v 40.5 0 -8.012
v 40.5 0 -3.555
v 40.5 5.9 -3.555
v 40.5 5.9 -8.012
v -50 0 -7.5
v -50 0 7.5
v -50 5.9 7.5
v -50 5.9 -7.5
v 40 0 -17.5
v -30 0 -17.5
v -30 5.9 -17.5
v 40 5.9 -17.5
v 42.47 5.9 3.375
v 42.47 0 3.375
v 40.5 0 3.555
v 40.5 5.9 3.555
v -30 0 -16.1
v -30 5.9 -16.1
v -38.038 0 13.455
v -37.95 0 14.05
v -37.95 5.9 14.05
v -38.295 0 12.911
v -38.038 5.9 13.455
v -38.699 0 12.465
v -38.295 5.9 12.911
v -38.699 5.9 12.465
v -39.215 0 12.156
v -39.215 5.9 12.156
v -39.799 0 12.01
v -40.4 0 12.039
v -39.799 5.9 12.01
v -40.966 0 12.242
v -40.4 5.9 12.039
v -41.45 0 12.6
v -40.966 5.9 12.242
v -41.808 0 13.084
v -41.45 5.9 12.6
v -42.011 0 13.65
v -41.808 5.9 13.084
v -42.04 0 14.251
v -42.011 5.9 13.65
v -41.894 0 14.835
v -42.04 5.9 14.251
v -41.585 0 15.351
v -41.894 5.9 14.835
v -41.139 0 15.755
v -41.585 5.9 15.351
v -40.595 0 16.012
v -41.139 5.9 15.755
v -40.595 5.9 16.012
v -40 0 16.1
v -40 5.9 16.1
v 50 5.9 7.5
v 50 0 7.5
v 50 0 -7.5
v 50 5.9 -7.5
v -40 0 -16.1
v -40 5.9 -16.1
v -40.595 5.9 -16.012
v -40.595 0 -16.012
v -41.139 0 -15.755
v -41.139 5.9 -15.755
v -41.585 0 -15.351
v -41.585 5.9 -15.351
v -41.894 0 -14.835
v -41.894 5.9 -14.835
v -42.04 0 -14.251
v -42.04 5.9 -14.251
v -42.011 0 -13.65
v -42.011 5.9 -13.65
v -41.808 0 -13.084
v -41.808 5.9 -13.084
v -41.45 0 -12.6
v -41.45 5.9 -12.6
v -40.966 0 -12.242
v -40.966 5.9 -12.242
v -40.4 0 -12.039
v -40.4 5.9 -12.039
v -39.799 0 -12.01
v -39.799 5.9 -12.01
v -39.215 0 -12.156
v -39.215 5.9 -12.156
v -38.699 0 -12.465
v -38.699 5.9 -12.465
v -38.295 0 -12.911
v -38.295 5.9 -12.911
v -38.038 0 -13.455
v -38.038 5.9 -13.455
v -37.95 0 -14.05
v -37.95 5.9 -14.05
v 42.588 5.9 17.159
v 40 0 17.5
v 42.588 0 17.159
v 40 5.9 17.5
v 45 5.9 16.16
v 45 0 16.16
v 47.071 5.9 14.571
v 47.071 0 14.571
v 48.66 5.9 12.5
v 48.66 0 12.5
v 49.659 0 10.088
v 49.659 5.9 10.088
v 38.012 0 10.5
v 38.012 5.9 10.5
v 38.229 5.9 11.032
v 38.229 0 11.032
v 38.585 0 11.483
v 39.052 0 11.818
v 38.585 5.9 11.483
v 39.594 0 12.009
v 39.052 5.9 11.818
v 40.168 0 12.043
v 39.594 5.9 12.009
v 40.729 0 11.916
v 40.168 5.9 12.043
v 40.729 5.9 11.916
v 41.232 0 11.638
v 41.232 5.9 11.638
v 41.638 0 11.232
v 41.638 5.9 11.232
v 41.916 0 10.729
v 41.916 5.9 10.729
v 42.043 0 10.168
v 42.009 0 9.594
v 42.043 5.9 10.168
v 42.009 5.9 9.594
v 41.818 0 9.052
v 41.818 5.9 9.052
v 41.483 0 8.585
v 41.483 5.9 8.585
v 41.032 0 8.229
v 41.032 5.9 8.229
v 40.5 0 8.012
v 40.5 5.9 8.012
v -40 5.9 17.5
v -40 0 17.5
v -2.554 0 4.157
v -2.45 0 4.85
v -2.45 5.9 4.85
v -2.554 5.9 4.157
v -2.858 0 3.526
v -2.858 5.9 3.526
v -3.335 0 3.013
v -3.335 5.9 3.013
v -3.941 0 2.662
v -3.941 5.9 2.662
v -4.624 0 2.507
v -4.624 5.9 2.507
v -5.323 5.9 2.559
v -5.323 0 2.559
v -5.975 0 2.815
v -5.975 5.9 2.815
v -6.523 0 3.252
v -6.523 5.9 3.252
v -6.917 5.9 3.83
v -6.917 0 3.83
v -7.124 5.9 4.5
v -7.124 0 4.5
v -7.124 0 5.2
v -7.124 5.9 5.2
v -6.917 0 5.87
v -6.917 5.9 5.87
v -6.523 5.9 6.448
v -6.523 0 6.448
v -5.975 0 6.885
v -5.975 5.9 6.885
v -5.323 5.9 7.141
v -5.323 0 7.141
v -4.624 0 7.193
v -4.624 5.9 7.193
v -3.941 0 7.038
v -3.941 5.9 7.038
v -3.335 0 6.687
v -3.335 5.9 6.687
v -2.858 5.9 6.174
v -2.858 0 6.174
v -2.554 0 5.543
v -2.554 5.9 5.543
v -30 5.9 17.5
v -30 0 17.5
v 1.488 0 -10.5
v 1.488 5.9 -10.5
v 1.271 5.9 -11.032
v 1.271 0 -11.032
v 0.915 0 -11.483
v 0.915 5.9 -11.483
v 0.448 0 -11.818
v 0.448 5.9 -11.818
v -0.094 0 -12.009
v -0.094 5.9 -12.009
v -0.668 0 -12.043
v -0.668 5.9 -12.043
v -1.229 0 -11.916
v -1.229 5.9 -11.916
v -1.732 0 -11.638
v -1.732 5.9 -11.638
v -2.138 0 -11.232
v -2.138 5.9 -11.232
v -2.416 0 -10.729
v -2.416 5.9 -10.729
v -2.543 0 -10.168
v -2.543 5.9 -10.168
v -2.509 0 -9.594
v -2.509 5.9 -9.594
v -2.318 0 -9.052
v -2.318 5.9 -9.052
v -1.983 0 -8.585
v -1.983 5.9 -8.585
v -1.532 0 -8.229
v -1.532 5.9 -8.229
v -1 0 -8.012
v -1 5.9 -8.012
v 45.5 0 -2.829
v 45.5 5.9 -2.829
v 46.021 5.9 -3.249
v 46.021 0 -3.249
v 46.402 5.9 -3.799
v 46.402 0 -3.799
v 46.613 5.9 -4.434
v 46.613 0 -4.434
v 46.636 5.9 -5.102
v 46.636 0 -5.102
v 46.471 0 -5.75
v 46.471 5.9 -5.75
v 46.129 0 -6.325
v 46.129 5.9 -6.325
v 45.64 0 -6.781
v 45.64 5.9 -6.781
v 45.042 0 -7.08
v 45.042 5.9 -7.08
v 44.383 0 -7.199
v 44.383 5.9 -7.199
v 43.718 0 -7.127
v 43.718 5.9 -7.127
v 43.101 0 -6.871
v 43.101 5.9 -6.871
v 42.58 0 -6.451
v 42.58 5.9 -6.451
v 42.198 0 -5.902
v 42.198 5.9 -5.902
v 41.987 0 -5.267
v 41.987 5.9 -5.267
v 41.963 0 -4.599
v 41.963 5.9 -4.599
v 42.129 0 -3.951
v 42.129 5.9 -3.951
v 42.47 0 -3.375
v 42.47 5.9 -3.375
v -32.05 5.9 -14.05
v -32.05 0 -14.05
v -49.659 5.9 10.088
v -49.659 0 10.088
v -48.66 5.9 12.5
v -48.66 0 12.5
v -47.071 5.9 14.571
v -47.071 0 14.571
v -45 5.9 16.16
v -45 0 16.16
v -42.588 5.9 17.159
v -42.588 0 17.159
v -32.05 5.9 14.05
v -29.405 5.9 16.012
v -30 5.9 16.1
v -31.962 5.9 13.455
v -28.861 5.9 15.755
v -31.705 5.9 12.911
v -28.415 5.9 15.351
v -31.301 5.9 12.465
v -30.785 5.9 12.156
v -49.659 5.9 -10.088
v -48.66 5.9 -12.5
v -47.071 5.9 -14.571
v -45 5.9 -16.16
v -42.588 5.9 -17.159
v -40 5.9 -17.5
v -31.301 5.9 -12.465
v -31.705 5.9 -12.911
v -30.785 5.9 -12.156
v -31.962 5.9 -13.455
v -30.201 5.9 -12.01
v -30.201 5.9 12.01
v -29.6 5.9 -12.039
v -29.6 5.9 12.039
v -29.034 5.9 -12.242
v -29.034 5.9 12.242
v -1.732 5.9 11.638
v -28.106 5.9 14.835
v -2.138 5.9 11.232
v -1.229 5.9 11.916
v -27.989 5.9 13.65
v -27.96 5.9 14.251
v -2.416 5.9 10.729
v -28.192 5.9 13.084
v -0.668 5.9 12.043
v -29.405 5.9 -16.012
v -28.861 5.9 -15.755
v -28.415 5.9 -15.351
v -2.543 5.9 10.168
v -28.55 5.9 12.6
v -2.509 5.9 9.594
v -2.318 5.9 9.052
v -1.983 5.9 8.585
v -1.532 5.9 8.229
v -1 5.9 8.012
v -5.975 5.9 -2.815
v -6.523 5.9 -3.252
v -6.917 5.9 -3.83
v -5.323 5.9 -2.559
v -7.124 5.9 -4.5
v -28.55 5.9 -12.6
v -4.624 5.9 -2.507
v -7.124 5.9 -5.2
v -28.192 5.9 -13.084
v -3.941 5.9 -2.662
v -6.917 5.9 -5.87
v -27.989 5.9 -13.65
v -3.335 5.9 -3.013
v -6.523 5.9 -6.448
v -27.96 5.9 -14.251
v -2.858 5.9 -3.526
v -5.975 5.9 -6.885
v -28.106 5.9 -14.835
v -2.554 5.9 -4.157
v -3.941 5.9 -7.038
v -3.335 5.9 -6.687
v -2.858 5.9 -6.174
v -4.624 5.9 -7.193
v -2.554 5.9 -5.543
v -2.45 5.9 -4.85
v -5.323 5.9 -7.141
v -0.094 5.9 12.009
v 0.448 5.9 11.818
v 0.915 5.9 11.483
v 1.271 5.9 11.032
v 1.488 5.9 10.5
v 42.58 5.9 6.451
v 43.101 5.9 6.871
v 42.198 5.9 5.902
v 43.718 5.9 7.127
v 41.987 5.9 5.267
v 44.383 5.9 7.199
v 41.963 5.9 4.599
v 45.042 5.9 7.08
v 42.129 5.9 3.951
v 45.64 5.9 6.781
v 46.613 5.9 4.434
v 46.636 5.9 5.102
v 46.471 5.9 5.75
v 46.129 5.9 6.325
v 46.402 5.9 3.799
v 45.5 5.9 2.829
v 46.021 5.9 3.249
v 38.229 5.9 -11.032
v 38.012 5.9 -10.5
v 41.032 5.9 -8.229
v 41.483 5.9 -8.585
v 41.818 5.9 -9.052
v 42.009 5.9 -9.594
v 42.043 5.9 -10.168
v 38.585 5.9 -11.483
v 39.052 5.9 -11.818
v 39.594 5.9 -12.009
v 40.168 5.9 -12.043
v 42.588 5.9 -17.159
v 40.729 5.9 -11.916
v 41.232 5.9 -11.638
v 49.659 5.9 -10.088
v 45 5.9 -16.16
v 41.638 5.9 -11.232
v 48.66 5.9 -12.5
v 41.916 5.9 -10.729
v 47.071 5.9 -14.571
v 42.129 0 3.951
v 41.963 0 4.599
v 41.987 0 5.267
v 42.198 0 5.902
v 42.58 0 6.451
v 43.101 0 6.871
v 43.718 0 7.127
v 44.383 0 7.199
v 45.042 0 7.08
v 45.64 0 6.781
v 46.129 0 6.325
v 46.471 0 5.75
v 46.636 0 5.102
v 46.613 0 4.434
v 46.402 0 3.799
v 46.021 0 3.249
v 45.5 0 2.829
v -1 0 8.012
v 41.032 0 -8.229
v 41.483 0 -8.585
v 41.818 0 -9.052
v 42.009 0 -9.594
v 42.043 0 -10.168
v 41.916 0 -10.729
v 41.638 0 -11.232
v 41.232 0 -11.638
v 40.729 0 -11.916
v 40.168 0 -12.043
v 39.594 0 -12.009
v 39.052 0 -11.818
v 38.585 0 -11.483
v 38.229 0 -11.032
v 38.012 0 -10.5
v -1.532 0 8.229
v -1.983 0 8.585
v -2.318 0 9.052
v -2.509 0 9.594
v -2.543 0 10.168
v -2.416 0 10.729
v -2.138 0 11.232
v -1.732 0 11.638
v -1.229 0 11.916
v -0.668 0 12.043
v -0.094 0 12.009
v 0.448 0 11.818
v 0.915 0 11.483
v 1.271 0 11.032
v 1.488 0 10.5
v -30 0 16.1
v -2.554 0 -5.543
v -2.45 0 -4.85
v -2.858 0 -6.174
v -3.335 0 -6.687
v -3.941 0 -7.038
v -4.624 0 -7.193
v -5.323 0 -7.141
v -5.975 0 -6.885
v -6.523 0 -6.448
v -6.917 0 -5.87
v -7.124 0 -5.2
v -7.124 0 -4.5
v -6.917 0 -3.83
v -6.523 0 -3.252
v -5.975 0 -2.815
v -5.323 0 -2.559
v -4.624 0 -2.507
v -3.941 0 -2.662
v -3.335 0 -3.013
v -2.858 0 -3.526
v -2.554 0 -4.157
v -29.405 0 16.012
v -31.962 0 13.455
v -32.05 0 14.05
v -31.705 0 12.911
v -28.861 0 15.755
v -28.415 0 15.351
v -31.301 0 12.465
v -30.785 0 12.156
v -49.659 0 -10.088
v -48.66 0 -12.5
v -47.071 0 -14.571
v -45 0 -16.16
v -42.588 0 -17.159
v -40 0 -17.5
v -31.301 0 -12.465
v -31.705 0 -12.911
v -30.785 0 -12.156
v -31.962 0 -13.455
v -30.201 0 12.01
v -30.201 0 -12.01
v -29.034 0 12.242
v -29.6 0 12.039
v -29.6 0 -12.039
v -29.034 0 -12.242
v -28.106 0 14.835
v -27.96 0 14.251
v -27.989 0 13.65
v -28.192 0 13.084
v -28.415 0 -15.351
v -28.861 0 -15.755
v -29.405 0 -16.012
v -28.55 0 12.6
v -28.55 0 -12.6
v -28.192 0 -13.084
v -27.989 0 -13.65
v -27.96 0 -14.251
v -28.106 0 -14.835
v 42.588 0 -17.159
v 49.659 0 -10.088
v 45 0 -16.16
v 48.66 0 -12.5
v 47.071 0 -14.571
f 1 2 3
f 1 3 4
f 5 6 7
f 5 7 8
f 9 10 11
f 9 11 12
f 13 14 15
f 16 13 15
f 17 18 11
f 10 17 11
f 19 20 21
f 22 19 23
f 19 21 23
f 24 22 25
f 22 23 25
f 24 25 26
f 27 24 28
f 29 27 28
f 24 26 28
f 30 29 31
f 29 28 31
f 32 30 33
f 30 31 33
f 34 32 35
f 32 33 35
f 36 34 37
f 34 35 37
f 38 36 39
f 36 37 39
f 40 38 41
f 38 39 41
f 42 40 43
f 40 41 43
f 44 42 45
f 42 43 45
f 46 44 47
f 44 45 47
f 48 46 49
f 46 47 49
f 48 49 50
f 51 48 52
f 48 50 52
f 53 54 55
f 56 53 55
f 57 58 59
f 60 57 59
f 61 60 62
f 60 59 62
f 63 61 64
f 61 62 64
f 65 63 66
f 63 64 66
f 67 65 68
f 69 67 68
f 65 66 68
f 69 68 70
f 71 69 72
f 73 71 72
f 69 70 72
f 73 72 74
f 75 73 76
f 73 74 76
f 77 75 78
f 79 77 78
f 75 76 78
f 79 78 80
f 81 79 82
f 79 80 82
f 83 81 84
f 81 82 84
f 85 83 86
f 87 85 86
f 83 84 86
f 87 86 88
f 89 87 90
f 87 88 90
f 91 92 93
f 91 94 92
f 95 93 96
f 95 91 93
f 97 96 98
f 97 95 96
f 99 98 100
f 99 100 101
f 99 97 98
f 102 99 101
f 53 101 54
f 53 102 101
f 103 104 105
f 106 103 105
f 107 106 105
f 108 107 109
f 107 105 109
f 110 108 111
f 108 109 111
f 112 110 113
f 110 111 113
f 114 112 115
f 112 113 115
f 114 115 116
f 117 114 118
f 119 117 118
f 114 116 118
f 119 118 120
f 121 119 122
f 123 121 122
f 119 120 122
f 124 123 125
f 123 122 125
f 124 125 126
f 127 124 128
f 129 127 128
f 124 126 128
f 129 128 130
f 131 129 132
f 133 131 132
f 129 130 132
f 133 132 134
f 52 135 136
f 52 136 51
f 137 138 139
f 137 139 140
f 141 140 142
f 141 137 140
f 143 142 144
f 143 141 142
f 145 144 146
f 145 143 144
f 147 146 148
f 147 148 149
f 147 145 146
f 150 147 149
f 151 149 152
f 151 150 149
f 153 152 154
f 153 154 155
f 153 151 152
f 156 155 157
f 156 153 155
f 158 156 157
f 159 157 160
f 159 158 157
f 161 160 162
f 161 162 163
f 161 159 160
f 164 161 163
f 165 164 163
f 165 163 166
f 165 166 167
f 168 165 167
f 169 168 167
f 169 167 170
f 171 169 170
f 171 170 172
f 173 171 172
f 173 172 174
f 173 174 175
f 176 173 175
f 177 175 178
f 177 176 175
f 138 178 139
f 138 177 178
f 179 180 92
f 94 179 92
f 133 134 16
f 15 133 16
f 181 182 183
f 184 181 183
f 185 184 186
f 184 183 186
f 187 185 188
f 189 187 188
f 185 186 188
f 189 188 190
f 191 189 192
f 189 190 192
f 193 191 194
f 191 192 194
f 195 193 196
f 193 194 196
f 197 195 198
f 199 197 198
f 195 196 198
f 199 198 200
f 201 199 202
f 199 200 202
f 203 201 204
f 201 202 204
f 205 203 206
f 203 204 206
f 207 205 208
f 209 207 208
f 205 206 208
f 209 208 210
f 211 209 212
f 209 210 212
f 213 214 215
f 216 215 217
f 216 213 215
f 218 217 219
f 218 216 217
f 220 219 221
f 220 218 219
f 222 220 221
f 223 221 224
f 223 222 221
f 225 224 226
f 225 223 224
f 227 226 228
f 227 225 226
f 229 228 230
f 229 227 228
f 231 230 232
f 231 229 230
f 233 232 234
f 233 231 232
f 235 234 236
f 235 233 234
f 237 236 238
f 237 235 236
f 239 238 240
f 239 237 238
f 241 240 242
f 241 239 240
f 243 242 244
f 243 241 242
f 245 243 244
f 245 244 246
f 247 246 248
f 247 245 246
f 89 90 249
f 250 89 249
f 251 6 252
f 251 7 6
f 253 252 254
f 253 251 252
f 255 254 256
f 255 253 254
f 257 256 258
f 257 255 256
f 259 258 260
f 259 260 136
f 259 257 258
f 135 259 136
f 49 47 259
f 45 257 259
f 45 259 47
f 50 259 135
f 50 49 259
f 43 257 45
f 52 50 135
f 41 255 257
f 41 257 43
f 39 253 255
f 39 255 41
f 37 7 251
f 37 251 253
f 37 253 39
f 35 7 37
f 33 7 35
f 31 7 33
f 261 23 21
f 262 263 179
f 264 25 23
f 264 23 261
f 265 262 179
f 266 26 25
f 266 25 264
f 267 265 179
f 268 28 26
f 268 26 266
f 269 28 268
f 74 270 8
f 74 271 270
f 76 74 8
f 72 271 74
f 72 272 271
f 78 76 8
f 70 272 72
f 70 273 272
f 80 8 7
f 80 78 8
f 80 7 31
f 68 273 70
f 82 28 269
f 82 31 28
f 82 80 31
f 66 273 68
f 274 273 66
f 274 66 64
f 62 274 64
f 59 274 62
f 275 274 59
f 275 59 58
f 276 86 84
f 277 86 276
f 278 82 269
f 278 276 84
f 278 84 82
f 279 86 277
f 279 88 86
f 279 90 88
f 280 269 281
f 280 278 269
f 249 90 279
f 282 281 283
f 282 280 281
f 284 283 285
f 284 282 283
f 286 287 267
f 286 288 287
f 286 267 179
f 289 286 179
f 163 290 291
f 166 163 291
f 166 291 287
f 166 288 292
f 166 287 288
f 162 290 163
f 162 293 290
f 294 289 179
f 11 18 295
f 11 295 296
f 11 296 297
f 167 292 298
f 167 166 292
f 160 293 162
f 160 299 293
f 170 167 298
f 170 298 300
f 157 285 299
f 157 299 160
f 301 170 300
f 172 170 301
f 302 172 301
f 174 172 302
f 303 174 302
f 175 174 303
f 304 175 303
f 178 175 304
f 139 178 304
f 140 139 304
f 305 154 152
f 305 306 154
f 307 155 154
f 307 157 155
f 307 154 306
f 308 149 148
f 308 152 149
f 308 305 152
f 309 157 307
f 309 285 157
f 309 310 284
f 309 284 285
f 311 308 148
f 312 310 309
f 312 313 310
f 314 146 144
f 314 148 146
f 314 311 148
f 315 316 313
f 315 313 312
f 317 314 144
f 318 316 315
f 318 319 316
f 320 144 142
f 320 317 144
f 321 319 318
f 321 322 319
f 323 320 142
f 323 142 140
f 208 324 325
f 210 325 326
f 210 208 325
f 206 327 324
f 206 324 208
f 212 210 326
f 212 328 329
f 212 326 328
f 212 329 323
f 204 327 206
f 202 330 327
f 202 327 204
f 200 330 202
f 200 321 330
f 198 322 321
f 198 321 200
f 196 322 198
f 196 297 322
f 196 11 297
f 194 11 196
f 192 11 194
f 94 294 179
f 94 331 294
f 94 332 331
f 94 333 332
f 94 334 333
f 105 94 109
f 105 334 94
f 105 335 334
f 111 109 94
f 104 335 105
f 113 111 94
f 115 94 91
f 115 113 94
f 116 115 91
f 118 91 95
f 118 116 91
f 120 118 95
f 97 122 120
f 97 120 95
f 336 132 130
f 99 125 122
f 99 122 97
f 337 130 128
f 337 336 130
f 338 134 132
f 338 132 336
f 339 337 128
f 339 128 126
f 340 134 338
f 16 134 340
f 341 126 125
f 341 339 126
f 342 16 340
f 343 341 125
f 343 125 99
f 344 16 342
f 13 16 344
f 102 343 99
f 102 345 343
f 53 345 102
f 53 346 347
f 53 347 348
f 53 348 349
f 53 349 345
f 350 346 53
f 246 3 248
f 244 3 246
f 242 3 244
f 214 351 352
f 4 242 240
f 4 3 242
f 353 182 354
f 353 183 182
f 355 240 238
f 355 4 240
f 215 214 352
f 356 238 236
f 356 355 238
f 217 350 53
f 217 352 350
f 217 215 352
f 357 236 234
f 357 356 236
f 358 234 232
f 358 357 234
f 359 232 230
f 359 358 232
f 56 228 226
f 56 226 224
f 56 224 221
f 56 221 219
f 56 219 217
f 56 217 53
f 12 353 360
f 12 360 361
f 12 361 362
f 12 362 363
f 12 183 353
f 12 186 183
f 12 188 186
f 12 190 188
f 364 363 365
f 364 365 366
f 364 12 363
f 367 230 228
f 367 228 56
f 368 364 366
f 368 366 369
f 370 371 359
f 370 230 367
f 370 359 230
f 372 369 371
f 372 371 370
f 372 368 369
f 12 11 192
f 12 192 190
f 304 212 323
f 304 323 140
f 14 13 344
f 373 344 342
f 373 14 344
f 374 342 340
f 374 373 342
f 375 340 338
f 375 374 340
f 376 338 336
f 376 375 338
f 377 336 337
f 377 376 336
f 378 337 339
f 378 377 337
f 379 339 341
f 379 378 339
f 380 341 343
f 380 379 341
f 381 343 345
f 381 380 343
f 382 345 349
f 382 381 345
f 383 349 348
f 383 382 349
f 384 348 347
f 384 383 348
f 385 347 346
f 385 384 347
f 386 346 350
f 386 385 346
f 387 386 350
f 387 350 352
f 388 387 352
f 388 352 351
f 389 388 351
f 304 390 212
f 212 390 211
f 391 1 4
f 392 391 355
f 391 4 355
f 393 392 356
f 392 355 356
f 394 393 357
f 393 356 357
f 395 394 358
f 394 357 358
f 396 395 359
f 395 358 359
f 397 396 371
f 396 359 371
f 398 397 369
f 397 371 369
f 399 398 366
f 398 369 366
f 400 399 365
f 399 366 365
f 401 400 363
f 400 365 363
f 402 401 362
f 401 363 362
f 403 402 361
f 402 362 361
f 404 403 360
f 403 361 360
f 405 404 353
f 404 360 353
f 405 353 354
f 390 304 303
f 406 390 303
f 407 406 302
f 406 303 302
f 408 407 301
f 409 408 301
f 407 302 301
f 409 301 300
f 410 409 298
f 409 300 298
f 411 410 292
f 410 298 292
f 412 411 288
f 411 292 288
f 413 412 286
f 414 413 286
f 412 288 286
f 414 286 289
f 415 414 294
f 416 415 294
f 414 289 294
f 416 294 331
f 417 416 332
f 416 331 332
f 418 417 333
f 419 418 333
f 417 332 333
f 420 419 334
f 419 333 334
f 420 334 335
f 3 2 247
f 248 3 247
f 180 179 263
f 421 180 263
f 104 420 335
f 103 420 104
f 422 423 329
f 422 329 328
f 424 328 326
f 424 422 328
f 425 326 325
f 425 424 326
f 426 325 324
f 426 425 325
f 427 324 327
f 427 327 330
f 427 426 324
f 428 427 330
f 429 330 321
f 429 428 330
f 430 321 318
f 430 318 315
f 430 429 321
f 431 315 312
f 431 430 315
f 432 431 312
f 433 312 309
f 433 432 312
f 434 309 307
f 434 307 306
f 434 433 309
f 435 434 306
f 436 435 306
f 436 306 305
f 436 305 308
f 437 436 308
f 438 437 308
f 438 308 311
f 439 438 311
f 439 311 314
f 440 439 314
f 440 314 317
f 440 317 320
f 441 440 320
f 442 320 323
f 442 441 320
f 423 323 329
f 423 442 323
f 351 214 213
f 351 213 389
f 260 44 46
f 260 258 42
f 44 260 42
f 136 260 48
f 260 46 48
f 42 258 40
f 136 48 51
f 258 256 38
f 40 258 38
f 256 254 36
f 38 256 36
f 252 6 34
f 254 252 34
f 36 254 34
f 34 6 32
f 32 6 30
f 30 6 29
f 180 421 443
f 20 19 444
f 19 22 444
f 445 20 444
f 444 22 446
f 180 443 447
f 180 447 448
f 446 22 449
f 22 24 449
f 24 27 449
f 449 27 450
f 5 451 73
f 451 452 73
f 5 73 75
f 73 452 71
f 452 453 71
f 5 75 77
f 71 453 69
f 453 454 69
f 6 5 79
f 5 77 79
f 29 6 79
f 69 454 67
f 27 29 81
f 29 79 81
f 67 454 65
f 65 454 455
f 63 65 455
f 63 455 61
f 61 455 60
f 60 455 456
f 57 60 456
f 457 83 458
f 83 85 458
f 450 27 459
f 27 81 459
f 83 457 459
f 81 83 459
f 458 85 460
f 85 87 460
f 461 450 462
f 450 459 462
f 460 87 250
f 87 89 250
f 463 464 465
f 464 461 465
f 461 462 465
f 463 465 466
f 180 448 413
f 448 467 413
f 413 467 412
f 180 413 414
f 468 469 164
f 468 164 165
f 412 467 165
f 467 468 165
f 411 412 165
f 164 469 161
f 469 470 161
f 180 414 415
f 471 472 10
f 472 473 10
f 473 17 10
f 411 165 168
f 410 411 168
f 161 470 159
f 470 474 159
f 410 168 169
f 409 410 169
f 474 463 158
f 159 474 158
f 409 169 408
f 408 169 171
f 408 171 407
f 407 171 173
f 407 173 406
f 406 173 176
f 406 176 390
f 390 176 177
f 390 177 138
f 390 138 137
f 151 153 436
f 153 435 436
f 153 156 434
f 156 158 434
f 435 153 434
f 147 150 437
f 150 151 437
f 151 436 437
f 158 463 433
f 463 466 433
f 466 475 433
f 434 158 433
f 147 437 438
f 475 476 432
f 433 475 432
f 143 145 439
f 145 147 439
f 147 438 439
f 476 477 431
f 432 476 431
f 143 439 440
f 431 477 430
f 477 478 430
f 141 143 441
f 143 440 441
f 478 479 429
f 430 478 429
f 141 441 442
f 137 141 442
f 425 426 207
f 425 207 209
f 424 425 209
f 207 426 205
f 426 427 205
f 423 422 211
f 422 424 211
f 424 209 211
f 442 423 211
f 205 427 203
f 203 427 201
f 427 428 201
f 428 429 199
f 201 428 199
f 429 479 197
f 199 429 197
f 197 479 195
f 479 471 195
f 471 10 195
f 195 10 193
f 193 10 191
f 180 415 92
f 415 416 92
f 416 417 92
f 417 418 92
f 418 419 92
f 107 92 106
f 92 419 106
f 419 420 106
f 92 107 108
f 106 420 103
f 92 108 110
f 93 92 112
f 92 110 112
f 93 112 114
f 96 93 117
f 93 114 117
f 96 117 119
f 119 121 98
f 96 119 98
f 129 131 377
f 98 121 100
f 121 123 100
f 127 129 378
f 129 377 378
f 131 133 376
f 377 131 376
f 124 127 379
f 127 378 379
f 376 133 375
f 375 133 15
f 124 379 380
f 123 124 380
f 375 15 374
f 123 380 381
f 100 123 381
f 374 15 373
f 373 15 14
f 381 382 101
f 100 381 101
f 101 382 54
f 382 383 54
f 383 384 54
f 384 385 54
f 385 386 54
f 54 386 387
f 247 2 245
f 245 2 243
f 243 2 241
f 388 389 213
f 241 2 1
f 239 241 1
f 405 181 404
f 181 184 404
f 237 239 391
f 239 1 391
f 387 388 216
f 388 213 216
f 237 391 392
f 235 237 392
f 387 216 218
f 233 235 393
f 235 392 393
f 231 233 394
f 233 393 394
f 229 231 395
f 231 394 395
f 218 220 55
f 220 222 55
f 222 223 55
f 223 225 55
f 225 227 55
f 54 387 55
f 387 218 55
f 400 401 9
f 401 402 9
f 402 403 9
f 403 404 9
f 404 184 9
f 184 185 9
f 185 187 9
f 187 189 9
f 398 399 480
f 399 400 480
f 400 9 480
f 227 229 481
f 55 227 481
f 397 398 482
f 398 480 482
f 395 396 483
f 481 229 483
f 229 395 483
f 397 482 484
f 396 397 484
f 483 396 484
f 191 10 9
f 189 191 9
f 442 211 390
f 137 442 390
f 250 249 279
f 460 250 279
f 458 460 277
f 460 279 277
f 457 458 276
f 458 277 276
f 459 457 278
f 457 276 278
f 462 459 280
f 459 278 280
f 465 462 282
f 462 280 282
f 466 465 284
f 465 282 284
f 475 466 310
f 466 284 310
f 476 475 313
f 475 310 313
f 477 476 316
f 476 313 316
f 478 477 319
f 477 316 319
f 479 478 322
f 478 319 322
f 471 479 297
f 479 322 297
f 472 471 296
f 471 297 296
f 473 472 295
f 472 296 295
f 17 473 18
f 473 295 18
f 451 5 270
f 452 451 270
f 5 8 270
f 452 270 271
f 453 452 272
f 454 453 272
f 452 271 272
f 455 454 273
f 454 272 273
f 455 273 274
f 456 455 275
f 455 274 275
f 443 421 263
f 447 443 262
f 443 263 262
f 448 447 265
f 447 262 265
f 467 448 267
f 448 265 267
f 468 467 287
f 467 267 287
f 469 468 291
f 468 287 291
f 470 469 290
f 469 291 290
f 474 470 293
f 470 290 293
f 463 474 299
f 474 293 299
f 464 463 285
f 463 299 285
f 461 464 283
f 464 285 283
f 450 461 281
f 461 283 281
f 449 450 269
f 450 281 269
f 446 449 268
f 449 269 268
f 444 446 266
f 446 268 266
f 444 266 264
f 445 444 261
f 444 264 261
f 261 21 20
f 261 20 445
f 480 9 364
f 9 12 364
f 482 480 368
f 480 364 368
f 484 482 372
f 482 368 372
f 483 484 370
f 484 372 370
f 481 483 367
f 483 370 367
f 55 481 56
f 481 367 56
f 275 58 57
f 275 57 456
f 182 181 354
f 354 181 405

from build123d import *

# Parameters (mm, degrees)
SKETCH1_W           = 100
SKETCH1_H           = 35
SKETCH1_R           = 2.35
SKETCH1_W_2         = 40.5
SKETCH1_H_2         = 20
BOSS_EXTRUDE1_DEPTH = 5.9
FILLET1_R           = 10
SKETCH3_W           = 10
SKETCH3_H           = 3.45
CUT_EXTRUDE2_DEPTH  = 10
CUT_EXTRUDE3_REACH  = 7.9
SKETCH4_R           = 2.05
CUT_EXTRUDE4_REACH  = 7.9
CUT_EXTRUDE5_START  = -5.9
SKETCH7_W           = 41.5
SKETCH7_H           = 21
CUT_EXTRUDE5_DEPTH  = 5.9


with BuildPart() as part:
    # Sketch1 → Boss-Extrude1 (new body)
    with BuildSketch(Plane(origin=(0, 0, 0), x_dir=(1, 0, 0), z_dir=(0, 1, 0))):
        Rectangle(SKETCH1_W, SKETCH1_H)
        with Locations((-4.8, 4.85)):
            Circle(SKETCH1_R, mode=Mode.SUBTRACT)
        with Locations((-4.8, -4.85)):
            Circle(SKETCH1_R, mode=Mode.SUBTRACT)
        with Locations((44.3, -4.85)):
            Circle(SKETCH1_R, mode=Mode.SUBTRACT)
        with Locations((44.3, 4.85)):
            Circle(SKETCH1_R, mode=Mode.SUBTRACT)
        with Locations((19.75, 0)):
            Rectangle(SKETCH1_W_2, SKETCH1_H_2, mode=Mode.SUBTRACT)
    extrude(amount=BOSS_EXTRUDE1_DEPTH)

    # Fillet1
    fillet1_edges = [part.edges().sort_by_distance(p)[0] for p in [
        (50, 2.95, 17.5),
        (-50, 2.95, 17.5),
        (-50, 2.95, -17.5),
        (50, 2.95, -17.5),
    ]]
    fillet(fillet1_edges, radius=FILLET1_R)

    # Sketch3 → Cut-Extrude2 (cut)
    with BuildSketch(Plane(origin=(0, 5.9, 0), x_dir=(1, 0, 0), z_dir=(0, 1, 0))):
        with Locations((-35, 15.775)):
            Rectangle(SKETCH3_W, SKETCH3_H)
        with Locations((-35, -15.775)):
            Rectangle(SKETCH3_W, SKETCH3_H)
    extrude(amount=-CUT_EXTRUDE2_DEPTH, mode=Mode.SUBTRACT)

    # Sketch4 → Cut-Extrude3 (cut, up to next)
    with BuildSketch(Plane(origin=(0, 5.9, 0), x_dir=(1, 0, 0), z_dir=(0, 1, 0)), mode=Mode.PRIVATE) as cut_extrude3_sk1:
        with Locations((-30, 14.05)):
            Circle(SKETCH4_R)
    cut_extrude3_tool1 = extrude(cut_extrude3_sk1.sketch, amount=-CUT_EXTRUDE3_REACH, mode=Mode.PRIVATE) & part.part
    add(cut_extrude3_tool1.solids().sort_by_distance((-30, 5.9, -14.05))[0], mode=Mode.SUBTRACT)
    # Sketch4 → Cut-Extrude3 (cut, up to next)
    with BuildSketch(Plane(origin=(0, 5.9, 0), x_dir=(1, 0, 0), z_dir=(0, 1, 0)), mode=Mode.PRIVATE) as cut_extrude3_sk2:
        with Locations((-40, 14.05)):
            Circle(SKETCH4_R)
    cut_extrude3_tool2 = extrude(cut_extrude3_sk2.sketch, amount=-CUT_EXTRUDE3_REACH, mode=Mode.PRIVATE) & part.part
    add(cut_extrude3_tool2.solids().sort_by_distance((-40, 5.9, -14.05))[0], mode=Mode.SUBTRACT)
    # Sketch4 → Cut-Extrude3 (cut, up to next)
    with BuildSketch(Plane(origin=(0, 5.9, 0), x_dir=(1, 0, 0), z_dir=(0, 1, 0)), mode=Mode.PRIVATE) as cut_extrude3_sk3:
        with Locations((-40, -14.05)):
            Circle(SKETCH4_R)
    cut_extrude3_tool3 = extrude(cut_extrude3_sk3.sketch, amount=-CUT_EXTRUDE3_REACH, mode=Mode.PRIVATE) & part.part
    add(cut_extrude3_tool3.solids().sort_by_distance((-40, 5.9, 14.05))[0], mode=Mode.SUBTRACT)
    # Sketch4 → Cut-Extrude3 (cut, up to next)
    with BuildSketch(Plane(origin=(0, 5.9, 0), x_dir=(1, 0, 0), z_dir=(0, 1, 0)), mode=Mode.PRIVATE) as cut_extrude3_sk4:
        with Locations((-30, -14.05)):
            Circle(SKETCH4_R)
    cut_extrude3_tool4 = extrude(cut_extrude3_sk4.sketch, amount=-CUT_EXTRUDE3_REACH, mode=Mode.PRIVATE) & part.part
    add(cut_extrude3_tool4.solids().sort_by_distance((-30, 5.9, 14.05))[0], mode=Mode.SUBTRACT)
    # Sketch4 → Cut-Extrude3 (cut, up to next)
    with BuildSketch(Plane(origin=(0, 5.9, 0), x_dir=(1, 0, 0), z_dir=(0, 1, 0)), mode=Mode.PRIVATE) as cut_extrude3_sk5:
        with Locations((-0.5, 10)):
            Circle(SKETCH4_R)
    cut_extrude3_tool5 = extrude(cut_extrude3_sk5.sketch, amount=-CUT_EXTRUDE3_REACH, mode=Mode.PRIVATE) & part.part
    add(cut_extrude3_tool5.solids().sort_by_distance((-0.5, 5.9, -10))[0], mode=Mode.SUBTRACT)
    # Sketch4 → Cut-Extrude3 (cut, up to next)
    with BuildSketch(Plane(origin=(0, 5.9, 0), x_dir=(1, 0, 0), z_dir=(0, 1, 0)), mode=Mode.PRIVATE) as cut_extrude3_sk6:
        with Locations((-0.5, -10)):
            Circle(SKETCH4_R)
    cut_extrude3_tool6 = extrude(cut_extrude3_sk6.sketch, amount=-CUT_EXTRUDE3_REACH, mode=Mode.PRIVATE) & part.part
    add(cut_extrude3_tool6.solids().sort_by_distance((-0.5, 5.9, 10))[0], mode=Mode.SUBTRACT)
    # Sketch4 → Cut-Extrude3 (cut, up to next)
    with BuildSketch(Plane(origin=(0, 5.9, 0), x_dir=(1, 0, 0), z_dir=(0, 1, 0)), mode=Mode.PRIVATE) as cut_extrude3_sk7:
        with Locations((40, -10)):
            Circle(SKETCH4_R)
    cut_extrude3_tool7 = extrude(cut_extrude3_sk7.sketch, amount=-CUT_EXTRUDE3_REACH, mode=Mode.PRIVATE) & part.part
    add(cut_extrude3_tool7.solids().sort_by_distance((40, 5.9, 10))[0], mode=Mode.SUBTRACT)
    # Sketch4 → Cut-Extrude3 (cut, up to next)
    with BuildSketch(Plane(origin=(0, 5.9, 0), x_dir=(1, 0, 0), z_dir=(0, 1, 0)), mode=Mode.PRIVATE) as cut_extrude3_sk8:
        with Locations((40, 10)):
            Circle(SKETCH4_R)
    cut_extrude3_tool8 = extrude(cut_extrude3_sk8.sketch, amount=-CUT_EXTRUDE3_REACH, mode=Mode.PRIVATE) & part.part
    add(cut_extrude3_tool8.solids().sort_by_distance((40, 5.9, -10))[0], mode=Mode.SUBTRACT)

    # Sketch6 → Cut-Extrude4 (cut, up to next)
    with BuildSketch(Plane(origin=(0, 5.9, 0), x_dir=(1, 0, 0), z_dir=(0, 1, 0)), mode=Mode.PRIVATE) as cut_extrude4_sk1:
        Polygon((40, -3.1), (40, 3.1), (40, 3.6), (45.5, 3.1), (45.5, -3.1), (40, -3.6), align=None)
    cut_extrude4_tool1 = extrude(cut_extrude4_sk1.sketch, amount=-CUT_EXTRUDE4_REACH, mode=Mode.PRIVATE) & part.part
    add(cut_extrude4_tool1.solids().sort_by_distance((42.681592, 5.9, 0))[0], mode=Mode.SUBTRACT)

    # Sketch7 → Cut-Extrude5 (cut)
    with BuildSketch(Plane(origin=(0, 5.9, 0), x_dir=(1, 0, 0), z_dir=(0, 1, 0)).offset(CUT_EXTRUDE5_START)):
        with Locations((19.75, 0)):
            Rectangle(SKETCH7_W, SKETCH7_H)
    extrude(amount=CUT_EXTRUDE5_DEPTH, mode=Mode.SUBTRACT)


solid = part.part
